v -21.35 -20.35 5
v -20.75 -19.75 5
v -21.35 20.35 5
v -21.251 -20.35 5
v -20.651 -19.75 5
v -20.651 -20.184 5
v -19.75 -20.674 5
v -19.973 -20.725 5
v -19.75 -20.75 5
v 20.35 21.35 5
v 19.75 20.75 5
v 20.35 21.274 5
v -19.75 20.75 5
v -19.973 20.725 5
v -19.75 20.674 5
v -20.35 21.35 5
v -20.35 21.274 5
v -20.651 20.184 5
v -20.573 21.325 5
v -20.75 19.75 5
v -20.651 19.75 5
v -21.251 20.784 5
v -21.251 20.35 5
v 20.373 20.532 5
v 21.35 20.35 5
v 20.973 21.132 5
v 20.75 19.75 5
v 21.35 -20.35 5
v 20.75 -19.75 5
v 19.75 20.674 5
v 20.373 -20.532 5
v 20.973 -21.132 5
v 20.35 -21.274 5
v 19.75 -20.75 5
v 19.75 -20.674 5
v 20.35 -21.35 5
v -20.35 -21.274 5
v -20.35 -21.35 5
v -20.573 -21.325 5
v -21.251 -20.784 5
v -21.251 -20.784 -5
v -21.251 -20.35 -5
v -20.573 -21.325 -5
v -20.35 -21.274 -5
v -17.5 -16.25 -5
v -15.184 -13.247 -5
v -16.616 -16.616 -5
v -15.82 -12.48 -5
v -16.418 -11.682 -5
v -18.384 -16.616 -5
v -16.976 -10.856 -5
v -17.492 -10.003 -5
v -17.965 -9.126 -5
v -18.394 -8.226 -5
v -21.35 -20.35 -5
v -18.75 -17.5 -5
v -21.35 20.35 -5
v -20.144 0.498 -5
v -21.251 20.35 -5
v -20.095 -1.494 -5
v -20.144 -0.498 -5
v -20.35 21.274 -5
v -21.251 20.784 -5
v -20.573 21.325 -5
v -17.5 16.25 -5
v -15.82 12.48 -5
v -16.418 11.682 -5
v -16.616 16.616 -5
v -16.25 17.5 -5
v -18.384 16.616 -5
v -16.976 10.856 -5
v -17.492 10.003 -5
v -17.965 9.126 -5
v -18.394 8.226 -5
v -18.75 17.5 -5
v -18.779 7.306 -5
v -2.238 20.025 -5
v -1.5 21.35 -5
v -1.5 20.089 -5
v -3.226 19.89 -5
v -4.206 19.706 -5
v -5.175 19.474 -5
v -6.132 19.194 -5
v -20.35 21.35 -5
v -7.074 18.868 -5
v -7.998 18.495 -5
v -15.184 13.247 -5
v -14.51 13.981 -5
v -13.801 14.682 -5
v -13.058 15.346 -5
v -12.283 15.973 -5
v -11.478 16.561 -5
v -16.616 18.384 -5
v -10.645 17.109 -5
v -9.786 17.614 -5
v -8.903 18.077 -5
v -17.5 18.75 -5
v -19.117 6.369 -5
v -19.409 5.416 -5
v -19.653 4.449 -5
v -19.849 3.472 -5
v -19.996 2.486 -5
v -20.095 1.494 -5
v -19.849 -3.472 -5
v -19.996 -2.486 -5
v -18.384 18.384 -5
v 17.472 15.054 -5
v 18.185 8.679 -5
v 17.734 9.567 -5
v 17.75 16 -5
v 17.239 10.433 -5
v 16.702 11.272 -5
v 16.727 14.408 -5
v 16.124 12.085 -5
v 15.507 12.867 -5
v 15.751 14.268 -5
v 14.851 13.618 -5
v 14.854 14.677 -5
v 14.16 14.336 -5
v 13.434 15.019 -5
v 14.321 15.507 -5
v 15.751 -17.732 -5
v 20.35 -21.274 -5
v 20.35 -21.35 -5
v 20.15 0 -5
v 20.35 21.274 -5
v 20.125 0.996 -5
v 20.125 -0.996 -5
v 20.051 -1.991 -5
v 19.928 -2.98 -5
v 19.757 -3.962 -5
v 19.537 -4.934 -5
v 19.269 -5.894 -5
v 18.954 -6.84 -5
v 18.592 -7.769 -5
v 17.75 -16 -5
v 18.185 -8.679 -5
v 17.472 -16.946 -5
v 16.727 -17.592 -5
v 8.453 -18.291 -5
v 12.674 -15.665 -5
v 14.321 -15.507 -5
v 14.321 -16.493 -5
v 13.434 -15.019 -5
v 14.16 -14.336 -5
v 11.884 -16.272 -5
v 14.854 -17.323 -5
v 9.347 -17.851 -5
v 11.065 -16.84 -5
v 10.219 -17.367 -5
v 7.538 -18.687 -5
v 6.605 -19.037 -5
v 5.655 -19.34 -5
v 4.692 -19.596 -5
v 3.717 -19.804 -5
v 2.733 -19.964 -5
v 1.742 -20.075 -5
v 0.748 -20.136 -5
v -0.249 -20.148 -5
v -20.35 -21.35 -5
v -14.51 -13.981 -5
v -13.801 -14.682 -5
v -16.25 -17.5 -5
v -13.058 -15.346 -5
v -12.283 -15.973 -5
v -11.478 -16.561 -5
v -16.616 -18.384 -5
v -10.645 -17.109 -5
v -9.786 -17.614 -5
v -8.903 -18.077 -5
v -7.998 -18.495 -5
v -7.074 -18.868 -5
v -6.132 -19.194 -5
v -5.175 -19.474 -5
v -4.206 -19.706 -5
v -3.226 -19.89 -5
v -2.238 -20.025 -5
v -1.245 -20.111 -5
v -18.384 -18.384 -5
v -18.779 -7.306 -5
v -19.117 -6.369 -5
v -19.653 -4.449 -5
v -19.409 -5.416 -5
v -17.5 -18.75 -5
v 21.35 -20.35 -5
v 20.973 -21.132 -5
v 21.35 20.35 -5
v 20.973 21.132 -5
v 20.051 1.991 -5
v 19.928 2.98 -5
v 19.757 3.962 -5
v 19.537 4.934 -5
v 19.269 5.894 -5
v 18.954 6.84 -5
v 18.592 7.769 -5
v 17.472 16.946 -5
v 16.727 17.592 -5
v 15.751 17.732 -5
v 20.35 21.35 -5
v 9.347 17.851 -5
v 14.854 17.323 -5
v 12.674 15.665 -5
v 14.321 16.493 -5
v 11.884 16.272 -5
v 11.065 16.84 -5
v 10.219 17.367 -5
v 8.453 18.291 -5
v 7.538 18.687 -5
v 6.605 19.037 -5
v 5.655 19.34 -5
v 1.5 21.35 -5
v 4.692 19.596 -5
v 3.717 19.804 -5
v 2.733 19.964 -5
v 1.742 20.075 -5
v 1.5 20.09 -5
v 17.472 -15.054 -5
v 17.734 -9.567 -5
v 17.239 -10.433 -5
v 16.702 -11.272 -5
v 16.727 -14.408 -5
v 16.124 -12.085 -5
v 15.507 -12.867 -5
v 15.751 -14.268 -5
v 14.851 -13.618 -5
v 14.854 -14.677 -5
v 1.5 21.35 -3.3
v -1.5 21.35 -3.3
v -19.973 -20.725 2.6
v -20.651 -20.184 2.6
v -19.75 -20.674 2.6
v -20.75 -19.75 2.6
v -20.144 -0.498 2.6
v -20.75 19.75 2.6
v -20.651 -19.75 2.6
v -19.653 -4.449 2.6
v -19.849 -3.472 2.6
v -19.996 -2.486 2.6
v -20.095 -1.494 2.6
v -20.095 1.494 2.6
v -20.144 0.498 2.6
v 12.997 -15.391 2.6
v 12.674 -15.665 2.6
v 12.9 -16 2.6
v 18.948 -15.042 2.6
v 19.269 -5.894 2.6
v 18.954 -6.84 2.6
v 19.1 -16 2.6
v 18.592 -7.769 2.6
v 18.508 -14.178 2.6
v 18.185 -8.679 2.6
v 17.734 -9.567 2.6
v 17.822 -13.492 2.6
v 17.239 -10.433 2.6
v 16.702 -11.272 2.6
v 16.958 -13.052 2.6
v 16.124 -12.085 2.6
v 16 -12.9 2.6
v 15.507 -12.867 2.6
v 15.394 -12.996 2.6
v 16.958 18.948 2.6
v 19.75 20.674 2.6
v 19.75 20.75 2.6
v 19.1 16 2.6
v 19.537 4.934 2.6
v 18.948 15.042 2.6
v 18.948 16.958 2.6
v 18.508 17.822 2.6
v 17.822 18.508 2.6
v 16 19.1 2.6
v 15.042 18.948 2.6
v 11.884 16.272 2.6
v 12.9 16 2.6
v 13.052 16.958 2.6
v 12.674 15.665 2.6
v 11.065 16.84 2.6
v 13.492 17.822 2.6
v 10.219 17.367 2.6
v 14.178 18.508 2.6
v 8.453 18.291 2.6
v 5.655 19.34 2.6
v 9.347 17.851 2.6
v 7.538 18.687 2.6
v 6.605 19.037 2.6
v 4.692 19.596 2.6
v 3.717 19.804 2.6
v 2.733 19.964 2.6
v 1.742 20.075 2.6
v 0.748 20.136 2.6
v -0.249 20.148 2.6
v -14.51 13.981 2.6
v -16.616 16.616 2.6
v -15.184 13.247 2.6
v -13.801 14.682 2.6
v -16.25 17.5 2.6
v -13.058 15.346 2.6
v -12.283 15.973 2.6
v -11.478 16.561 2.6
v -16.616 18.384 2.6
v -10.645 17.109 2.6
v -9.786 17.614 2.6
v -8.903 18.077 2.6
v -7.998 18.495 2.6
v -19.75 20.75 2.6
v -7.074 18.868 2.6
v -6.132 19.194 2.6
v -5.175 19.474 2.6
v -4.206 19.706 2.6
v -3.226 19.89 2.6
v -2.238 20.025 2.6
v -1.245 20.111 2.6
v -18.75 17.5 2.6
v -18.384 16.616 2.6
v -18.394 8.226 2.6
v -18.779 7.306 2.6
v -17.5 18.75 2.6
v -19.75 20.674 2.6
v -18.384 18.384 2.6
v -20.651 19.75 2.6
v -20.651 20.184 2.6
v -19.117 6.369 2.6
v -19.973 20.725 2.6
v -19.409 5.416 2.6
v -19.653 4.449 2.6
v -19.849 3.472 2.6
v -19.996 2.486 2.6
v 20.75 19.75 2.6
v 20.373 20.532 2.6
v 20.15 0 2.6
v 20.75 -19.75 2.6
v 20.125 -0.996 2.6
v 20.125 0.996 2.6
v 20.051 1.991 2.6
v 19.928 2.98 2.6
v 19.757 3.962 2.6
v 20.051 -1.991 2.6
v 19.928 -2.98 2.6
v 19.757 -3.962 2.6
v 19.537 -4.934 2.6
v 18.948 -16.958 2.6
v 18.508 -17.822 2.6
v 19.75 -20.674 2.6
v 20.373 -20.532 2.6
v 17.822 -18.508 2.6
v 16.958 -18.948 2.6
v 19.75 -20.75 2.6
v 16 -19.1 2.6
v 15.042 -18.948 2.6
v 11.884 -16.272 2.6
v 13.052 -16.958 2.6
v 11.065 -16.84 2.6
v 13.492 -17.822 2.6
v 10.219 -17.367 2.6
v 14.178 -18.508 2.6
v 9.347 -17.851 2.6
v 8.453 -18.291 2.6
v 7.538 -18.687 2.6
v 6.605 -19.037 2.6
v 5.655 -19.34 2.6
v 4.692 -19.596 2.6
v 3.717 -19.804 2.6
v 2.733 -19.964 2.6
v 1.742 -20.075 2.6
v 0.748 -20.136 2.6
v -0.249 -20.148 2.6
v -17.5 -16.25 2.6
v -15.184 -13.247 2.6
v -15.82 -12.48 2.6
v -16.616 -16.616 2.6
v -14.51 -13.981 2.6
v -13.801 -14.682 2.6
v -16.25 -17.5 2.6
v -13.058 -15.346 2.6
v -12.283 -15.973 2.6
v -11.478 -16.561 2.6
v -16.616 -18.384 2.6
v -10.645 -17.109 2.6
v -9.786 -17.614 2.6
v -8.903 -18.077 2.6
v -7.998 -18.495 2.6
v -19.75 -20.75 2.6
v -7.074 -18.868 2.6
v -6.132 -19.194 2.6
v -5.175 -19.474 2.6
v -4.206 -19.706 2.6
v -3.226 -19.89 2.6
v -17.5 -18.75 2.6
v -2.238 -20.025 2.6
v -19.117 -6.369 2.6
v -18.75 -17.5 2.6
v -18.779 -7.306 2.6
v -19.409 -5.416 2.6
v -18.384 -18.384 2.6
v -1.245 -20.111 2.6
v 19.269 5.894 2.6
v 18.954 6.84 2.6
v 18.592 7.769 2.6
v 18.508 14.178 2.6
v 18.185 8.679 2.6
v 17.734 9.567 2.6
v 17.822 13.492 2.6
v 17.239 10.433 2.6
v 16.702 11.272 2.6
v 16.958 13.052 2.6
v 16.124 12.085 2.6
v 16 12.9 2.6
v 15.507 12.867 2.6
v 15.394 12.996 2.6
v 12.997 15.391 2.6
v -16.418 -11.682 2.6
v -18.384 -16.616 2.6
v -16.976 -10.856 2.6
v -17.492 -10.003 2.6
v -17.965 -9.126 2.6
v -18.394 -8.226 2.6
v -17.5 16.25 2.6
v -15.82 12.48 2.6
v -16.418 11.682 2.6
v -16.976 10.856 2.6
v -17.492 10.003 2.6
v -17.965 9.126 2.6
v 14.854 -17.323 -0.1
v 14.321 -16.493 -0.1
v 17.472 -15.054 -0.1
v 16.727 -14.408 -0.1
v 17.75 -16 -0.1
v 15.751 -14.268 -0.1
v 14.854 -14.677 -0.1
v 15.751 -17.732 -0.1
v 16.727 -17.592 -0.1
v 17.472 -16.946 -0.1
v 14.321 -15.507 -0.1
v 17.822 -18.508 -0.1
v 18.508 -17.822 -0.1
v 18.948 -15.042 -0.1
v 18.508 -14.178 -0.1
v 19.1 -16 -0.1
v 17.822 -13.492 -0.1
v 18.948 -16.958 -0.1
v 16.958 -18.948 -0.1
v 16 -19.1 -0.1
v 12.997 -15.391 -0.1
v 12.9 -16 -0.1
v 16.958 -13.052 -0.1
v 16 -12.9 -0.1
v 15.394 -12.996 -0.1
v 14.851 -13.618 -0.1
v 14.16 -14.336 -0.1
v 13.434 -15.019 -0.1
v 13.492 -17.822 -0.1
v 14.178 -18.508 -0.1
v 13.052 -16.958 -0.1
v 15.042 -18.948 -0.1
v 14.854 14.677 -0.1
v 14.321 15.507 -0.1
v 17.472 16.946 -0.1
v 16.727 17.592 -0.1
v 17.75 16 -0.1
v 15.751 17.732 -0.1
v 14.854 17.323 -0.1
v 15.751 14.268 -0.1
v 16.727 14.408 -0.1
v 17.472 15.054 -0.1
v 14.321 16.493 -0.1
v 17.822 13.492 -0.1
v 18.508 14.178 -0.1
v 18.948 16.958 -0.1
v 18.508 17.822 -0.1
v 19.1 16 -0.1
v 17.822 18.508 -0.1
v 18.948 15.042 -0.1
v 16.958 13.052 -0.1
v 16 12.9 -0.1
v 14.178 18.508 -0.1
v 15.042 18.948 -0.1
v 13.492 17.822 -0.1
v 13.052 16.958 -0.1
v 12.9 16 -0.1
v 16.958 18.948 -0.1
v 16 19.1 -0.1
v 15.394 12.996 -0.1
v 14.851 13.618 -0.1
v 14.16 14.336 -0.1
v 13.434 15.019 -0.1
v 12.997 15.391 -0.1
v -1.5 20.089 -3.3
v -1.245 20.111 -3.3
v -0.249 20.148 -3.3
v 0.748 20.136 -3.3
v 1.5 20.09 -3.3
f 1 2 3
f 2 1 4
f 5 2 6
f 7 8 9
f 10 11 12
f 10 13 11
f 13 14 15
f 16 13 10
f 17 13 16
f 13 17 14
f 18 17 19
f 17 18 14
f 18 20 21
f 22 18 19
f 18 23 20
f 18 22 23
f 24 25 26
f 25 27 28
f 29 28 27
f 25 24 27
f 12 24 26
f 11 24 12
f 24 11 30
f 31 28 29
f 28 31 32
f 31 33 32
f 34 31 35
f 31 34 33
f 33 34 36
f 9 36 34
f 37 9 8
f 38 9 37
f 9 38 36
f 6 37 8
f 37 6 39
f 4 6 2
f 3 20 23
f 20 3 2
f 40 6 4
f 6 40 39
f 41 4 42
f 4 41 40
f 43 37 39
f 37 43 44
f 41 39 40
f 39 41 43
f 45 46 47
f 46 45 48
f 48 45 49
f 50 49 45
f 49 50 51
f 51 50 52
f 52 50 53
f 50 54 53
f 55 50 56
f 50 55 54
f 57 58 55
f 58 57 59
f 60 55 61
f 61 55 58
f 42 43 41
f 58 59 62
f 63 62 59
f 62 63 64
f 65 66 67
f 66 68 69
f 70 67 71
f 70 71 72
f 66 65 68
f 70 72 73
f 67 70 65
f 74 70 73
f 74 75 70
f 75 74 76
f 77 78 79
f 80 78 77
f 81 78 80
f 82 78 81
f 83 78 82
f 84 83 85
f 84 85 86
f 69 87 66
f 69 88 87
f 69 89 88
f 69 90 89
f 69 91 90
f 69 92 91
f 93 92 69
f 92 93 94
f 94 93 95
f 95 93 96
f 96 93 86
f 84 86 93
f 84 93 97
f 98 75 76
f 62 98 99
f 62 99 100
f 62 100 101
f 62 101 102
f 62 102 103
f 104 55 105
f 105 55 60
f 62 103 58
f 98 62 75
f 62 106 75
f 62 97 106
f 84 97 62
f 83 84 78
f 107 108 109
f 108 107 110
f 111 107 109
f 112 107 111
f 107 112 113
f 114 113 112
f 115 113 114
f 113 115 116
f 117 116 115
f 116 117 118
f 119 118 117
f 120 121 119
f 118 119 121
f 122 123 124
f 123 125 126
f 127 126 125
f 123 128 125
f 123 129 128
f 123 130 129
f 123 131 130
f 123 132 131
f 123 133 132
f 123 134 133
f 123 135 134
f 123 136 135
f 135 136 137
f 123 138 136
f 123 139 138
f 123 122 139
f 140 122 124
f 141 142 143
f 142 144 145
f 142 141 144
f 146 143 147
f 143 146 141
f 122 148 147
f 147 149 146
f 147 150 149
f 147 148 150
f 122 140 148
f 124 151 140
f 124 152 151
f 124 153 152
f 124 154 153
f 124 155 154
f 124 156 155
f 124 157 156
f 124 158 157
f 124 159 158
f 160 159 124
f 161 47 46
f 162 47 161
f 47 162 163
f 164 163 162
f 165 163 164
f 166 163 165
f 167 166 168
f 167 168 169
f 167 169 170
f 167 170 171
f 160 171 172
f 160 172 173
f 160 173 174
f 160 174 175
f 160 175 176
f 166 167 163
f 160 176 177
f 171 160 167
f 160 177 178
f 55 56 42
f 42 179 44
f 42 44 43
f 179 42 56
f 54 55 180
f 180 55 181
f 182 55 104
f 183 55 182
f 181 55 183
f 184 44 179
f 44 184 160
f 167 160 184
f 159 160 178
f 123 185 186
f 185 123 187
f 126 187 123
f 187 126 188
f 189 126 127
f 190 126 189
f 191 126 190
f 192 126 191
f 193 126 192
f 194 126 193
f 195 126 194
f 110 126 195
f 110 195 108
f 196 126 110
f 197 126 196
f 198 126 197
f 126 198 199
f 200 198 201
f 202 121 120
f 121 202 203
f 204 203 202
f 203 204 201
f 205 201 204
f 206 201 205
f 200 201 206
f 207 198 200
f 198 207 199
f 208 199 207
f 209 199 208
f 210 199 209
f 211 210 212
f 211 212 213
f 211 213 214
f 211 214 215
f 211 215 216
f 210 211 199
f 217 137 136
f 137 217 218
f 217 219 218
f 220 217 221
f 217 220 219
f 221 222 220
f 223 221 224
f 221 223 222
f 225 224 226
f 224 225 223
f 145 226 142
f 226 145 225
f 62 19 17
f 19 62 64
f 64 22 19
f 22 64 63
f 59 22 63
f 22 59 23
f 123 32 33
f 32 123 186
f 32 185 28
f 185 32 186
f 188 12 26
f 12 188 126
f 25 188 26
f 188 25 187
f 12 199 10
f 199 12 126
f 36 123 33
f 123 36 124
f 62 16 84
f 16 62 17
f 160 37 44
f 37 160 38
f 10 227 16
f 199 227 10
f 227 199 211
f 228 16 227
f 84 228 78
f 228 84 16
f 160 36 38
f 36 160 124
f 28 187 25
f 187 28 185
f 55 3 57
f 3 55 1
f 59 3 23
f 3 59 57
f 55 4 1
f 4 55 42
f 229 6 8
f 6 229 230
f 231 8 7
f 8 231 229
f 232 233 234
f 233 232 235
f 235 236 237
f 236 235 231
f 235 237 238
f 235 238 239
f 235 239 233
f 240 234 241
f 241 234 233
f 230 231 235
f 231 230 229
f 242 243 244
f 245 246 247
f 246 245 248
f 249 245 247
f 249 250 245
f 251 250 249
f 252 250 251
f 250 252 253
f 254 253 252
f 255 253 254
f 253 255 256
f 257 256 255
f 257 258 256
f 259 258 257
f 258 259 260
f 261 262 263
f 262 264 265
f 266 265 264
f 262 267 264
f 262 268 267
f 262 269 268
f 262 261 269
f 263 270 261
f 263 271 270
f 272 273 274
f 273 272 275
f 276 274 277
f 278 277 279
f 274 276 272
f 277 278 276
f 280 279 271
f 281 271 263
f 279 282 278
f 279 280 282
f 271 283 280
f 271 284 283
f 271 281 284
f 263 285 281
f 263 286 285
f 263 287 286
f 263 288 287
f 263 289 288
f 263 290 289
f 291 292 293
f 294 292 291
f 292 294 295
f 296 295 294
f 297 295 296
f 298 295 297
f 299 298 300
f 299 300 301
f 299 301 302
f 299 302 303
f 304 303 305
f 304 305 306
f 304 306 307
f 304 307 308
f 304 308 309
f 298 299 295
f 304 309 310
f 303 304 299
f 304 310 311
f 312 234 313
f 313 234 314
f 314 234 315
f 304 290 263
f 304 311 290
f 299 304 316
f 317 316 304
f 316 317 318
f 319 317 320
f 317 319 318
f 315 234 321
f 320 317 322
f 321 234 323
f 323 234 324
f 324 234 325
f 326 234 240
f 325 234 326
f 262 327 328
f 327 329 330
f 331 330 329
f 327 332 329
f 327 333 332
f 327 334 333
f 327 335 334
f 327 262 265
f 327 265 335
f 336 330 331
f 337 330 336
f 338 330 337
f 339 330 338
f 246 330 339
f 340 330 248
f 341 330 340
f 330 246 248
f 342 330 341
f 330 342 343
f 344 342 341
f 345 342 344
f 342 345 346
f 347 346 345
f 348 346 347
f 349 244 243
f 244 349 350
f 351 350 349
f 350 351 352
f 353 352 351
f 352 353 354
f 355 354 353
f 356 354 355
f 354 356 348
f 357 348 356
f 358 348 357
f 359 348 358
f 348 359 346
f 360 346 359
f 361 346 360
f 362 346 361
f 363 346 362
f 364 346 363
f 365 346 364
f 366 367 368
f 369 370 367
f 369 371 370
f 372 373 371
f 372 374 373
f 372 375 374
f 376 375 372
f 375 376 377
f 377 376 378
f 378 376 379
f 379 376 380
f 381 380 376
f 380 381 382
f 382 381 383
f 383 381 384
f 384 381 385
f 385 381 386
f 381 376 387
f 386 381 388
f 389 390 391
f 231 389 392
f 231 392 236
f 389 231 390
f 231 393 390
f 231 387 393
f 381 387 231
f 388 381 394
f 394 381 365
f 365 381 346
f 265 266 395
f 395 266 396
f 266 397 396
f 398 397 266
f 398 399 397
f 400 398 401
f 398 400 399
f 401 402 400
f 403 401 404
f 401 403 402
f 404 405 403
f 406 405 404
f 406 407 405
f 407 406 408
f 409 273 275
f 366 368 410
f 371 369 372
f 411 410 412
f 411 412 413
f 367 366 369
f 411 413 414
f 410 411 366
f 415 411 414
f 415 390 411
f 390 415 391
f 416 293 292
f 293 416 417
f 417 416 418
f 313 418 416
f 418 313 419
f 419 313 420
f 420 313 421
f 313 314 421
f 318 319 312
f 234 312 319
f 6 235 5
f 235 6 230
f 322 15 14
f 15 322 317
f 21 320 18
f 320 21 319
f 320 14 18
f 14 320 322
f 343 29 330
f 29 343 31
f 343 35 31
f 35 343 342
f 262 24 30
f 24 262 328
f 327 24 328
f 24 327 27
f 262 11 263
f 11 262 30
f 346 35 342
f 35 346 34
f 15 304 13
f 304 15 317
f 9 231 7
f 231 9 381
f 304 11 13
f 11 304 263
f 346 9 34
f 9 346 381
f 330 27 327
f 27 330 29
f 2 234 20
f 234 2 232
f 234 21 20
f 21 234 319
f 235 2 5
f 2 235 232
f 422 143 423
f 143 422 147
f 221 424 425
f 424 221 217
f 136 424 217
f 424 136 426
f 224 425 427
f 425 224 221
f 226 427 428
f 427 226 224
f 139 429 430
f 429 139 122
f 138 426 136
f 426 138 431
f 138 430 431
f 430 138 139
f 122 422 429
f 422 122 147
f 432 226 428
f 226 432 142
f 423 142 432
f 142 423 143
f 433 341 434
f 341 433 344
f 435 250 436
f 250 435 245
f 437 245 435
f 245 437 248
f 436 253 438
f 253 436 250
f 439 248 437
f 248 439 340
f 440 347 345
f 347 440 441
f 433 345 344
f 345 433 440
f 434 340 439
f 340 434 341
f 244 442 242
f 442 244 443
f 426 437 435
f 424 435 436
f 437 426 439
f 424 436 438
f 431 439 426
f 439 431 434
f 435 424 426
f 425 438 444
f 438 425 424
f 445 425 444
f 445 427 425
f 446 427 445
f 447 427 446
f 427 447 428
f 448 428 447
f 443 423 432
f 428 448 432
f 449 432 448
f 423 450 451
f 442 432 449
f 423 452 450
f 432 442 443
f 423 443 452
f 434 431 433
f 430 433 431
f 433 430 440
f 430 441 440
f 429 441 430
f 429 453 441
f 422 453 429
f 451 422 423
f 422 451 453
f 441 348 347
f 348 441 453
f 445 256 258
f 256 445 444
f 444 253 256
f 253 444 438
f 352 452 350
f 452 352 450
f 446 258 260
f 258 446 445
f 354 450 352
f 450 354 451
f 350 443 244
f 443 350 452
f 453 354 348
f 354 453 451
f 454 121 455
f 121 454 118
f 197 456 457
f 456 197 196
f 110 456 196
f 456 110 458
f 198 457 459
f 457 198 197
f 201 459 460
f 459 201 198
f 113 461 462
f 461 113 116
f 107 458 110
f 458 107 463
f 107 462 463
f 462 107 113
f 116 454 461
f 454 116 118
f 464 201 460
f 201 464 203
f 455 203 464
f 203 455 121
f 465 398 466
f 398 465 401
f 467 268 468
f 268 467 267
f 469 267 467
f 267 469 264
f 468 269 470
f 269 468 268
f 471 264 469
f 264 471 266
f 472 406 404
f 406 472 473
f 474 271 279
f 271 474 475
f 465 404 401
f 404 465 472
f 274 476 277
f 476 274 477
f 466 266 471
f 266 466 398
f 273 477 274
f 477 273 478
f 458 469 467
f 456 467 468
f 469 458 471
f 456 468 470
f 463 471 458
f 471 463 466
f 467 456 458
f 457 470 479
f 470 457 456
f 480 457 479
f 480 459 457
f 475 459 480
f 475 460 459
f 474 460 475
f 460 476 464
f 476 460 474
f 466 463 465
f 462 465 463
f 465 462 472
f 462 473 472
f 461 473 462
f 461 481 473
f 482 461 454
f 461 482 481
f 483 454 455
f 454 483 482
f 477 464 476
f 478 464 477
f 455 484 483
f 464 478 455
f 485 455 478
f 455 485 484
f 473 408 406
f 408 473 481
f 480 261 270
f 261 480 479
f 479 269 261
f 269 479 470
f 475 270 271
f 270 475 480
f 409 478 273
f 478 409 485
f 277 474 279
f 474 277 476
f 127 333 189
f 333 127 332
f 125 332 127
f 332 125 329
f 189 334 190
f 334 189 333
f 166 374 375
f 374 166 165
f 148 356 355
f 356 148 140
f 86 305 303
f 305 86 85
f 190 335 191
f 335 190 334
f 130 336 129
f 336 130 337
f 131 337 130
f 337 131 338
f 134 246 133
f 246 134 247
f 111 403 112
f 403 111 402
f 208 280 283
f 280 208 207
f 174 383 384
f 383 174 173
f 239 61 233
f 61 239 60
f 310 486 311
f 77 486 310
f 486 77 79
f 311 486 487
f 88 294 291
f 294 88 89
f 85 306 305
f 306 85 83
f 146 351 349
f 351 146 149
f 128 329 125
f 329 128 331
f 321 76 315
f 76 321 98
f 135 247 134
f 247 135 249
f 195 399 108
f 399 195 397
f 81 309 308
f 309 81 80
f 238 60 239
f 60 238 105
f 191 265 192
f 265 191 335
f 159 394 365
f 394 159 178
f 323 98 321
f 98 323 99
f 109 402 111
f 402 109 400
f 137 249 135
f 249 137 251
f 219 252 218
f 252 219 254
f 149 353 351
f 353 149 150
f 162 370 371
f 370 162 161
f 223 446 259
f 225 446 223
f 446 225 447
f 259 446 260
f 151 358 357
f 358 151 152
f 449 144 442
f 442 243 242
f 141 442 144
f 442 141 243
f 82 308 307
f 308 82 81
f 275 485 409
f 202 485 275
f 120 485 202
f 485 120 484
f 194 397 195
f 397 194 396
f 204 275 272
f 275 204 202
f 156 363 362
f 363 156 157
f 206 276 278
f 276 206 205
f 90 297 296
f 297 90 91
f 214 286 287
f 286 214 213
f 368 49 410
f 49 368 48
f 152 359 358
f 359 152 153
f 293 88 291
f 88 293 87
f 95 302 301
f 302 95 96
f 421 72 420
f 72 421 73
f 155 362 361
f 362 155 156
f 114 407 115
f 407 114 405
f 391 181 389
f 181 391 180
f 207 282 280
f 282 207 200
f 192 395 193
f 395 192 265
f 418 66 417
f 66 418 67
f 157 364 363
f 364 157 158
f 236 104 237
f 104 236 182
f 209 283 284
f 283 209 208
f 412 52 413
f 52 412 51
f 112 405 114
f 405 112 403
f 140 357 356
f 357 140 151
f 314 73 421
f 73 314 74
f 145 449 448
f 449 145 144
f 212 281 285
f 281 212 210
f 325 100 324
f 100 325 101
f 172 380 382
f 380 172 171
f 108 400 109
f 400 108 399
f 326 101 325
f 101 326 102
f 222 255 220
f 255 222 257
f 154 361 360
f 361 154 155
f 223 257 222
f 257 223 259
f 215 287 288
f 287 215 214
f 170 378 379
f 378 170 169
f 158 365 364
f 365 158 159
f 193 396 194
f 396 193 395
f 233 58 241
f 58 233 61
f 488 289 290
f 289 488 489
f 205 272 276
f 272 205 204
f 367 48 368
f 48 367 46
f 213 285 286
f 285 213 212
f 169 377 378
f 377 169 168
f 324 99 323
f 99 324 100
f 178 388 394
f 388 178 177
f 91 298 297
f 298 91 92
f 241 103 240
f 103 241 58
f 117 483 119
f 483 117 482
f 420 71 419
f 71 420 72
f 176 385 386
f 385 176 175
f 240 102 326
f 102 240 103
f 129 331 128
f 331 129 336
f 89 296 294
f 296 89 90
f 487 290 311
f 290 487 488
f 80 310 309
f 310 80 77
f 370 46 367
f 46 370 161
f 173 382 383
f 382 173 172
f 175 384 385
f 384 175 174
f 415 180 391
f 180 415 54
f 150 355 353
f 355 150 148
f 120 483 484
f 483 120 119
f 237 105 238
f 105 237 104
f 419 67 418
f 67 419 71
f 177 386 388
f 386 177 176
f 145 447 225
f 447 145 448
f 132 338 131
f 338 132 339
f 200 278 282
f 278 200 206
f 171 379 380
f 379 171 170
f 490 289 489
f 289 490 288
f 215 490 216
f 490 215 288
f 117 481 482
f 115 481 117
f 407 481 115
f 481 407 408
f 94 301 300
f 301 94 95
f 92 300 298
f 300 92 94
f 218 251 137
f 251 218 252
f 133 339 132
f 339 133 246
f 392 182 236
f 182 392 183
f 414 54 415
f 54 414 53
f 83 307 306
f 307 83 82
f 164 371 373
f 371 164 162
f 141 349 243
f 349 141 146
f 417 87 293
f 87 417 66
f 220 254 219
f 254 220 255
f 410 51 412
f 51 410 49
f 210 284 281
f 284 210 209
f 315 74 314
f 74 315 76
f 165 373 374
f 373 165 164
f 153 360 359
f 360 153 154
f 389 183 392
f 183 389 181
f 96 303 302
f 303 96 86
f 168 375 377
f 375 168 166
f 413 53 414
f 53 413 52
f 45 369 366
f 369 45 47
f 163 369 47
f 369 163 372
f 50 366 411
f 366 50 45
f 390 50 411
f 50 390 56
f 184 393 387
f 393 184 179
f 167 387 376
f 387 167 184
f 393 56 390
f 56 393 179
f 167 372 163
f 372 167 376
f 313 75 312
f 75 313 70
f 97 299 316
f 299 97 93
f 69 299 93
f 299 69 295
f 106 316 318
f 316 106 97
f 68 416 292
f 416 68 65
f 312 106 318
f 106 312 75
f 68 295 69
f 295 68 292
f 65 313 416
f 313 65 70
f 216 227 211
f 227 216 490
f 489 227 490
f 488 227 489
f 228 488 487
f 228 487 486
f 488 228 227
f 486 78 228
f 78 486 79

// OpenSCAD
use <MCAD/boxes.scad>;

/* [Global] */
// What is the fan size?
fan_w=40;//[40,50]

// What is the position of the holes?
holes = "side";// [fan:Regular fan only, vga:VGA fan only, both:Both fans, cross:Cross position, side:On one side]

/* [Hidden] */
$fs=1;
$fa=1.5;

wall_w = 1.2;
vga_w = 41.5;
vga_h = 10;
vga_int_h = vga_h - 2.4;
vga_hole = 35;
fan_hole = fan_w * 0.8;
vga_hole_d = 2.5;
fan_hole_d = 3.5;
fan_nut_d = 6.2;
fan_nut_h = 3;
wire_w = 3;
wire_h = 1.7;


difference()
{
	if(vga_w > fan_w)
	{
		roundedBox([vga_w + wall_w, vga_w + wall_w, vga_h],1,true);
	}
	else
	{
		roundedBox([fan_w + wall_w, fan_w + wall_w, vga_h],1,true);
	}
	union()
	{
		translate([0,0, vga_int_h/2+1]) roundedBox([vga_w, vga_w, vga_h - vga_int_h + 2],1,true);
		cylinder(r = (vga_w-wall_w)/2, h = vga_h+2, center = true);
		if( holes == "vga" || holes == "cross" || holes == "both"  || holes == "side")
		{
			translate([ -vga_hole/2, -vga_hole/2, 0])
				cylinder(r = vga_hole_d/2, h = vga_h+2, center = true);
		}
		if( holes == "vga" || holes == "cross" || holes == "both" )
		{
			translate([  vga_hole/2,  vga_hole/2, 0])
				cylinder(r = vga_hole_d/2, h = vga_h+2, center = true);
		}
		if( holes == "vga" || holes == "both" )
		{
			translate([  vga_hole/2, -vga_hole/2, 0])
				cylinder(r = vga_hole_d/2, h = vga_h+2, center = true);
		}
		if( holes == "vga" || holes == "both"  || holes == "side" )
		{
			translate([ -vga_hole/2,  vga_hole/2, 0])
				cylinder(r = vga_hole_d/2, h = vga_h+2, center = true);
		}

		if( holes == "fan" || holes == "cross" || holes == "both" )
		{
			translate([ -fan_hole/2,  fan_hole/2, 0])
			{
				cylinder(r = fan_hole_d/2, h = vga_h+2, center = true);
				translate([ 0, 0, vga_int_h/2-(vga_h-vga_int_h)+2])
					cylinder(r = fan_nut_d/2, h = fan_nut_h+4, center = true);
			}
		}
		if( holes == "fan" || holes == "cross" || holes == "both" || holes == "side" )
		{
			translate([  fan_hole/2,  -fan_hole/2, 0])
			{
				cylinder(r = fan_hole_d/2, h = vga_h+2, center = true);
				translate([ 0, 0, vga_int_h/2-(vga_h-vga_int_h)+2])
					cylinder(r = fan_nut_d/2, h = fan_nut_h+4, center = true);
			}
		}
		if( holes == "fan" || holes == "both"  || holes == "side" )
		{
			translate([  fan_hole/2,  fan_hole/2, 0])
			{
				cylinder(r = fan_hole_d/2, h = vga_h+2, center = true);
				translate([ 0, 0, vga_int_h/2-(vga_h-vga_int_h)+2])
					cylinder(r = fan_nut_d/2, h = fan_nut_h+4, center = true);
			}
		}
		if( holes == "fan" || holes == "both" )
		{
			translate([ -fan_hole/2,  -fan_hole/2, 0])
			{
				cylinder(r = fan_hole_d/2, h = vga_h+2, center = true);
				translate([ 0, 0, vga_int_h/2-(vga_h-vga_int_h)+2])
					cylinder(r = fan_nut_d/2, h = fan_nut_h+4, center = true);
			}
		}
		translate([-wire_w/2, 0, - vga_h/2 - 1])
			cube([wire_w,	vga_w + fan_w, wire_h + 1]);
	}
}
